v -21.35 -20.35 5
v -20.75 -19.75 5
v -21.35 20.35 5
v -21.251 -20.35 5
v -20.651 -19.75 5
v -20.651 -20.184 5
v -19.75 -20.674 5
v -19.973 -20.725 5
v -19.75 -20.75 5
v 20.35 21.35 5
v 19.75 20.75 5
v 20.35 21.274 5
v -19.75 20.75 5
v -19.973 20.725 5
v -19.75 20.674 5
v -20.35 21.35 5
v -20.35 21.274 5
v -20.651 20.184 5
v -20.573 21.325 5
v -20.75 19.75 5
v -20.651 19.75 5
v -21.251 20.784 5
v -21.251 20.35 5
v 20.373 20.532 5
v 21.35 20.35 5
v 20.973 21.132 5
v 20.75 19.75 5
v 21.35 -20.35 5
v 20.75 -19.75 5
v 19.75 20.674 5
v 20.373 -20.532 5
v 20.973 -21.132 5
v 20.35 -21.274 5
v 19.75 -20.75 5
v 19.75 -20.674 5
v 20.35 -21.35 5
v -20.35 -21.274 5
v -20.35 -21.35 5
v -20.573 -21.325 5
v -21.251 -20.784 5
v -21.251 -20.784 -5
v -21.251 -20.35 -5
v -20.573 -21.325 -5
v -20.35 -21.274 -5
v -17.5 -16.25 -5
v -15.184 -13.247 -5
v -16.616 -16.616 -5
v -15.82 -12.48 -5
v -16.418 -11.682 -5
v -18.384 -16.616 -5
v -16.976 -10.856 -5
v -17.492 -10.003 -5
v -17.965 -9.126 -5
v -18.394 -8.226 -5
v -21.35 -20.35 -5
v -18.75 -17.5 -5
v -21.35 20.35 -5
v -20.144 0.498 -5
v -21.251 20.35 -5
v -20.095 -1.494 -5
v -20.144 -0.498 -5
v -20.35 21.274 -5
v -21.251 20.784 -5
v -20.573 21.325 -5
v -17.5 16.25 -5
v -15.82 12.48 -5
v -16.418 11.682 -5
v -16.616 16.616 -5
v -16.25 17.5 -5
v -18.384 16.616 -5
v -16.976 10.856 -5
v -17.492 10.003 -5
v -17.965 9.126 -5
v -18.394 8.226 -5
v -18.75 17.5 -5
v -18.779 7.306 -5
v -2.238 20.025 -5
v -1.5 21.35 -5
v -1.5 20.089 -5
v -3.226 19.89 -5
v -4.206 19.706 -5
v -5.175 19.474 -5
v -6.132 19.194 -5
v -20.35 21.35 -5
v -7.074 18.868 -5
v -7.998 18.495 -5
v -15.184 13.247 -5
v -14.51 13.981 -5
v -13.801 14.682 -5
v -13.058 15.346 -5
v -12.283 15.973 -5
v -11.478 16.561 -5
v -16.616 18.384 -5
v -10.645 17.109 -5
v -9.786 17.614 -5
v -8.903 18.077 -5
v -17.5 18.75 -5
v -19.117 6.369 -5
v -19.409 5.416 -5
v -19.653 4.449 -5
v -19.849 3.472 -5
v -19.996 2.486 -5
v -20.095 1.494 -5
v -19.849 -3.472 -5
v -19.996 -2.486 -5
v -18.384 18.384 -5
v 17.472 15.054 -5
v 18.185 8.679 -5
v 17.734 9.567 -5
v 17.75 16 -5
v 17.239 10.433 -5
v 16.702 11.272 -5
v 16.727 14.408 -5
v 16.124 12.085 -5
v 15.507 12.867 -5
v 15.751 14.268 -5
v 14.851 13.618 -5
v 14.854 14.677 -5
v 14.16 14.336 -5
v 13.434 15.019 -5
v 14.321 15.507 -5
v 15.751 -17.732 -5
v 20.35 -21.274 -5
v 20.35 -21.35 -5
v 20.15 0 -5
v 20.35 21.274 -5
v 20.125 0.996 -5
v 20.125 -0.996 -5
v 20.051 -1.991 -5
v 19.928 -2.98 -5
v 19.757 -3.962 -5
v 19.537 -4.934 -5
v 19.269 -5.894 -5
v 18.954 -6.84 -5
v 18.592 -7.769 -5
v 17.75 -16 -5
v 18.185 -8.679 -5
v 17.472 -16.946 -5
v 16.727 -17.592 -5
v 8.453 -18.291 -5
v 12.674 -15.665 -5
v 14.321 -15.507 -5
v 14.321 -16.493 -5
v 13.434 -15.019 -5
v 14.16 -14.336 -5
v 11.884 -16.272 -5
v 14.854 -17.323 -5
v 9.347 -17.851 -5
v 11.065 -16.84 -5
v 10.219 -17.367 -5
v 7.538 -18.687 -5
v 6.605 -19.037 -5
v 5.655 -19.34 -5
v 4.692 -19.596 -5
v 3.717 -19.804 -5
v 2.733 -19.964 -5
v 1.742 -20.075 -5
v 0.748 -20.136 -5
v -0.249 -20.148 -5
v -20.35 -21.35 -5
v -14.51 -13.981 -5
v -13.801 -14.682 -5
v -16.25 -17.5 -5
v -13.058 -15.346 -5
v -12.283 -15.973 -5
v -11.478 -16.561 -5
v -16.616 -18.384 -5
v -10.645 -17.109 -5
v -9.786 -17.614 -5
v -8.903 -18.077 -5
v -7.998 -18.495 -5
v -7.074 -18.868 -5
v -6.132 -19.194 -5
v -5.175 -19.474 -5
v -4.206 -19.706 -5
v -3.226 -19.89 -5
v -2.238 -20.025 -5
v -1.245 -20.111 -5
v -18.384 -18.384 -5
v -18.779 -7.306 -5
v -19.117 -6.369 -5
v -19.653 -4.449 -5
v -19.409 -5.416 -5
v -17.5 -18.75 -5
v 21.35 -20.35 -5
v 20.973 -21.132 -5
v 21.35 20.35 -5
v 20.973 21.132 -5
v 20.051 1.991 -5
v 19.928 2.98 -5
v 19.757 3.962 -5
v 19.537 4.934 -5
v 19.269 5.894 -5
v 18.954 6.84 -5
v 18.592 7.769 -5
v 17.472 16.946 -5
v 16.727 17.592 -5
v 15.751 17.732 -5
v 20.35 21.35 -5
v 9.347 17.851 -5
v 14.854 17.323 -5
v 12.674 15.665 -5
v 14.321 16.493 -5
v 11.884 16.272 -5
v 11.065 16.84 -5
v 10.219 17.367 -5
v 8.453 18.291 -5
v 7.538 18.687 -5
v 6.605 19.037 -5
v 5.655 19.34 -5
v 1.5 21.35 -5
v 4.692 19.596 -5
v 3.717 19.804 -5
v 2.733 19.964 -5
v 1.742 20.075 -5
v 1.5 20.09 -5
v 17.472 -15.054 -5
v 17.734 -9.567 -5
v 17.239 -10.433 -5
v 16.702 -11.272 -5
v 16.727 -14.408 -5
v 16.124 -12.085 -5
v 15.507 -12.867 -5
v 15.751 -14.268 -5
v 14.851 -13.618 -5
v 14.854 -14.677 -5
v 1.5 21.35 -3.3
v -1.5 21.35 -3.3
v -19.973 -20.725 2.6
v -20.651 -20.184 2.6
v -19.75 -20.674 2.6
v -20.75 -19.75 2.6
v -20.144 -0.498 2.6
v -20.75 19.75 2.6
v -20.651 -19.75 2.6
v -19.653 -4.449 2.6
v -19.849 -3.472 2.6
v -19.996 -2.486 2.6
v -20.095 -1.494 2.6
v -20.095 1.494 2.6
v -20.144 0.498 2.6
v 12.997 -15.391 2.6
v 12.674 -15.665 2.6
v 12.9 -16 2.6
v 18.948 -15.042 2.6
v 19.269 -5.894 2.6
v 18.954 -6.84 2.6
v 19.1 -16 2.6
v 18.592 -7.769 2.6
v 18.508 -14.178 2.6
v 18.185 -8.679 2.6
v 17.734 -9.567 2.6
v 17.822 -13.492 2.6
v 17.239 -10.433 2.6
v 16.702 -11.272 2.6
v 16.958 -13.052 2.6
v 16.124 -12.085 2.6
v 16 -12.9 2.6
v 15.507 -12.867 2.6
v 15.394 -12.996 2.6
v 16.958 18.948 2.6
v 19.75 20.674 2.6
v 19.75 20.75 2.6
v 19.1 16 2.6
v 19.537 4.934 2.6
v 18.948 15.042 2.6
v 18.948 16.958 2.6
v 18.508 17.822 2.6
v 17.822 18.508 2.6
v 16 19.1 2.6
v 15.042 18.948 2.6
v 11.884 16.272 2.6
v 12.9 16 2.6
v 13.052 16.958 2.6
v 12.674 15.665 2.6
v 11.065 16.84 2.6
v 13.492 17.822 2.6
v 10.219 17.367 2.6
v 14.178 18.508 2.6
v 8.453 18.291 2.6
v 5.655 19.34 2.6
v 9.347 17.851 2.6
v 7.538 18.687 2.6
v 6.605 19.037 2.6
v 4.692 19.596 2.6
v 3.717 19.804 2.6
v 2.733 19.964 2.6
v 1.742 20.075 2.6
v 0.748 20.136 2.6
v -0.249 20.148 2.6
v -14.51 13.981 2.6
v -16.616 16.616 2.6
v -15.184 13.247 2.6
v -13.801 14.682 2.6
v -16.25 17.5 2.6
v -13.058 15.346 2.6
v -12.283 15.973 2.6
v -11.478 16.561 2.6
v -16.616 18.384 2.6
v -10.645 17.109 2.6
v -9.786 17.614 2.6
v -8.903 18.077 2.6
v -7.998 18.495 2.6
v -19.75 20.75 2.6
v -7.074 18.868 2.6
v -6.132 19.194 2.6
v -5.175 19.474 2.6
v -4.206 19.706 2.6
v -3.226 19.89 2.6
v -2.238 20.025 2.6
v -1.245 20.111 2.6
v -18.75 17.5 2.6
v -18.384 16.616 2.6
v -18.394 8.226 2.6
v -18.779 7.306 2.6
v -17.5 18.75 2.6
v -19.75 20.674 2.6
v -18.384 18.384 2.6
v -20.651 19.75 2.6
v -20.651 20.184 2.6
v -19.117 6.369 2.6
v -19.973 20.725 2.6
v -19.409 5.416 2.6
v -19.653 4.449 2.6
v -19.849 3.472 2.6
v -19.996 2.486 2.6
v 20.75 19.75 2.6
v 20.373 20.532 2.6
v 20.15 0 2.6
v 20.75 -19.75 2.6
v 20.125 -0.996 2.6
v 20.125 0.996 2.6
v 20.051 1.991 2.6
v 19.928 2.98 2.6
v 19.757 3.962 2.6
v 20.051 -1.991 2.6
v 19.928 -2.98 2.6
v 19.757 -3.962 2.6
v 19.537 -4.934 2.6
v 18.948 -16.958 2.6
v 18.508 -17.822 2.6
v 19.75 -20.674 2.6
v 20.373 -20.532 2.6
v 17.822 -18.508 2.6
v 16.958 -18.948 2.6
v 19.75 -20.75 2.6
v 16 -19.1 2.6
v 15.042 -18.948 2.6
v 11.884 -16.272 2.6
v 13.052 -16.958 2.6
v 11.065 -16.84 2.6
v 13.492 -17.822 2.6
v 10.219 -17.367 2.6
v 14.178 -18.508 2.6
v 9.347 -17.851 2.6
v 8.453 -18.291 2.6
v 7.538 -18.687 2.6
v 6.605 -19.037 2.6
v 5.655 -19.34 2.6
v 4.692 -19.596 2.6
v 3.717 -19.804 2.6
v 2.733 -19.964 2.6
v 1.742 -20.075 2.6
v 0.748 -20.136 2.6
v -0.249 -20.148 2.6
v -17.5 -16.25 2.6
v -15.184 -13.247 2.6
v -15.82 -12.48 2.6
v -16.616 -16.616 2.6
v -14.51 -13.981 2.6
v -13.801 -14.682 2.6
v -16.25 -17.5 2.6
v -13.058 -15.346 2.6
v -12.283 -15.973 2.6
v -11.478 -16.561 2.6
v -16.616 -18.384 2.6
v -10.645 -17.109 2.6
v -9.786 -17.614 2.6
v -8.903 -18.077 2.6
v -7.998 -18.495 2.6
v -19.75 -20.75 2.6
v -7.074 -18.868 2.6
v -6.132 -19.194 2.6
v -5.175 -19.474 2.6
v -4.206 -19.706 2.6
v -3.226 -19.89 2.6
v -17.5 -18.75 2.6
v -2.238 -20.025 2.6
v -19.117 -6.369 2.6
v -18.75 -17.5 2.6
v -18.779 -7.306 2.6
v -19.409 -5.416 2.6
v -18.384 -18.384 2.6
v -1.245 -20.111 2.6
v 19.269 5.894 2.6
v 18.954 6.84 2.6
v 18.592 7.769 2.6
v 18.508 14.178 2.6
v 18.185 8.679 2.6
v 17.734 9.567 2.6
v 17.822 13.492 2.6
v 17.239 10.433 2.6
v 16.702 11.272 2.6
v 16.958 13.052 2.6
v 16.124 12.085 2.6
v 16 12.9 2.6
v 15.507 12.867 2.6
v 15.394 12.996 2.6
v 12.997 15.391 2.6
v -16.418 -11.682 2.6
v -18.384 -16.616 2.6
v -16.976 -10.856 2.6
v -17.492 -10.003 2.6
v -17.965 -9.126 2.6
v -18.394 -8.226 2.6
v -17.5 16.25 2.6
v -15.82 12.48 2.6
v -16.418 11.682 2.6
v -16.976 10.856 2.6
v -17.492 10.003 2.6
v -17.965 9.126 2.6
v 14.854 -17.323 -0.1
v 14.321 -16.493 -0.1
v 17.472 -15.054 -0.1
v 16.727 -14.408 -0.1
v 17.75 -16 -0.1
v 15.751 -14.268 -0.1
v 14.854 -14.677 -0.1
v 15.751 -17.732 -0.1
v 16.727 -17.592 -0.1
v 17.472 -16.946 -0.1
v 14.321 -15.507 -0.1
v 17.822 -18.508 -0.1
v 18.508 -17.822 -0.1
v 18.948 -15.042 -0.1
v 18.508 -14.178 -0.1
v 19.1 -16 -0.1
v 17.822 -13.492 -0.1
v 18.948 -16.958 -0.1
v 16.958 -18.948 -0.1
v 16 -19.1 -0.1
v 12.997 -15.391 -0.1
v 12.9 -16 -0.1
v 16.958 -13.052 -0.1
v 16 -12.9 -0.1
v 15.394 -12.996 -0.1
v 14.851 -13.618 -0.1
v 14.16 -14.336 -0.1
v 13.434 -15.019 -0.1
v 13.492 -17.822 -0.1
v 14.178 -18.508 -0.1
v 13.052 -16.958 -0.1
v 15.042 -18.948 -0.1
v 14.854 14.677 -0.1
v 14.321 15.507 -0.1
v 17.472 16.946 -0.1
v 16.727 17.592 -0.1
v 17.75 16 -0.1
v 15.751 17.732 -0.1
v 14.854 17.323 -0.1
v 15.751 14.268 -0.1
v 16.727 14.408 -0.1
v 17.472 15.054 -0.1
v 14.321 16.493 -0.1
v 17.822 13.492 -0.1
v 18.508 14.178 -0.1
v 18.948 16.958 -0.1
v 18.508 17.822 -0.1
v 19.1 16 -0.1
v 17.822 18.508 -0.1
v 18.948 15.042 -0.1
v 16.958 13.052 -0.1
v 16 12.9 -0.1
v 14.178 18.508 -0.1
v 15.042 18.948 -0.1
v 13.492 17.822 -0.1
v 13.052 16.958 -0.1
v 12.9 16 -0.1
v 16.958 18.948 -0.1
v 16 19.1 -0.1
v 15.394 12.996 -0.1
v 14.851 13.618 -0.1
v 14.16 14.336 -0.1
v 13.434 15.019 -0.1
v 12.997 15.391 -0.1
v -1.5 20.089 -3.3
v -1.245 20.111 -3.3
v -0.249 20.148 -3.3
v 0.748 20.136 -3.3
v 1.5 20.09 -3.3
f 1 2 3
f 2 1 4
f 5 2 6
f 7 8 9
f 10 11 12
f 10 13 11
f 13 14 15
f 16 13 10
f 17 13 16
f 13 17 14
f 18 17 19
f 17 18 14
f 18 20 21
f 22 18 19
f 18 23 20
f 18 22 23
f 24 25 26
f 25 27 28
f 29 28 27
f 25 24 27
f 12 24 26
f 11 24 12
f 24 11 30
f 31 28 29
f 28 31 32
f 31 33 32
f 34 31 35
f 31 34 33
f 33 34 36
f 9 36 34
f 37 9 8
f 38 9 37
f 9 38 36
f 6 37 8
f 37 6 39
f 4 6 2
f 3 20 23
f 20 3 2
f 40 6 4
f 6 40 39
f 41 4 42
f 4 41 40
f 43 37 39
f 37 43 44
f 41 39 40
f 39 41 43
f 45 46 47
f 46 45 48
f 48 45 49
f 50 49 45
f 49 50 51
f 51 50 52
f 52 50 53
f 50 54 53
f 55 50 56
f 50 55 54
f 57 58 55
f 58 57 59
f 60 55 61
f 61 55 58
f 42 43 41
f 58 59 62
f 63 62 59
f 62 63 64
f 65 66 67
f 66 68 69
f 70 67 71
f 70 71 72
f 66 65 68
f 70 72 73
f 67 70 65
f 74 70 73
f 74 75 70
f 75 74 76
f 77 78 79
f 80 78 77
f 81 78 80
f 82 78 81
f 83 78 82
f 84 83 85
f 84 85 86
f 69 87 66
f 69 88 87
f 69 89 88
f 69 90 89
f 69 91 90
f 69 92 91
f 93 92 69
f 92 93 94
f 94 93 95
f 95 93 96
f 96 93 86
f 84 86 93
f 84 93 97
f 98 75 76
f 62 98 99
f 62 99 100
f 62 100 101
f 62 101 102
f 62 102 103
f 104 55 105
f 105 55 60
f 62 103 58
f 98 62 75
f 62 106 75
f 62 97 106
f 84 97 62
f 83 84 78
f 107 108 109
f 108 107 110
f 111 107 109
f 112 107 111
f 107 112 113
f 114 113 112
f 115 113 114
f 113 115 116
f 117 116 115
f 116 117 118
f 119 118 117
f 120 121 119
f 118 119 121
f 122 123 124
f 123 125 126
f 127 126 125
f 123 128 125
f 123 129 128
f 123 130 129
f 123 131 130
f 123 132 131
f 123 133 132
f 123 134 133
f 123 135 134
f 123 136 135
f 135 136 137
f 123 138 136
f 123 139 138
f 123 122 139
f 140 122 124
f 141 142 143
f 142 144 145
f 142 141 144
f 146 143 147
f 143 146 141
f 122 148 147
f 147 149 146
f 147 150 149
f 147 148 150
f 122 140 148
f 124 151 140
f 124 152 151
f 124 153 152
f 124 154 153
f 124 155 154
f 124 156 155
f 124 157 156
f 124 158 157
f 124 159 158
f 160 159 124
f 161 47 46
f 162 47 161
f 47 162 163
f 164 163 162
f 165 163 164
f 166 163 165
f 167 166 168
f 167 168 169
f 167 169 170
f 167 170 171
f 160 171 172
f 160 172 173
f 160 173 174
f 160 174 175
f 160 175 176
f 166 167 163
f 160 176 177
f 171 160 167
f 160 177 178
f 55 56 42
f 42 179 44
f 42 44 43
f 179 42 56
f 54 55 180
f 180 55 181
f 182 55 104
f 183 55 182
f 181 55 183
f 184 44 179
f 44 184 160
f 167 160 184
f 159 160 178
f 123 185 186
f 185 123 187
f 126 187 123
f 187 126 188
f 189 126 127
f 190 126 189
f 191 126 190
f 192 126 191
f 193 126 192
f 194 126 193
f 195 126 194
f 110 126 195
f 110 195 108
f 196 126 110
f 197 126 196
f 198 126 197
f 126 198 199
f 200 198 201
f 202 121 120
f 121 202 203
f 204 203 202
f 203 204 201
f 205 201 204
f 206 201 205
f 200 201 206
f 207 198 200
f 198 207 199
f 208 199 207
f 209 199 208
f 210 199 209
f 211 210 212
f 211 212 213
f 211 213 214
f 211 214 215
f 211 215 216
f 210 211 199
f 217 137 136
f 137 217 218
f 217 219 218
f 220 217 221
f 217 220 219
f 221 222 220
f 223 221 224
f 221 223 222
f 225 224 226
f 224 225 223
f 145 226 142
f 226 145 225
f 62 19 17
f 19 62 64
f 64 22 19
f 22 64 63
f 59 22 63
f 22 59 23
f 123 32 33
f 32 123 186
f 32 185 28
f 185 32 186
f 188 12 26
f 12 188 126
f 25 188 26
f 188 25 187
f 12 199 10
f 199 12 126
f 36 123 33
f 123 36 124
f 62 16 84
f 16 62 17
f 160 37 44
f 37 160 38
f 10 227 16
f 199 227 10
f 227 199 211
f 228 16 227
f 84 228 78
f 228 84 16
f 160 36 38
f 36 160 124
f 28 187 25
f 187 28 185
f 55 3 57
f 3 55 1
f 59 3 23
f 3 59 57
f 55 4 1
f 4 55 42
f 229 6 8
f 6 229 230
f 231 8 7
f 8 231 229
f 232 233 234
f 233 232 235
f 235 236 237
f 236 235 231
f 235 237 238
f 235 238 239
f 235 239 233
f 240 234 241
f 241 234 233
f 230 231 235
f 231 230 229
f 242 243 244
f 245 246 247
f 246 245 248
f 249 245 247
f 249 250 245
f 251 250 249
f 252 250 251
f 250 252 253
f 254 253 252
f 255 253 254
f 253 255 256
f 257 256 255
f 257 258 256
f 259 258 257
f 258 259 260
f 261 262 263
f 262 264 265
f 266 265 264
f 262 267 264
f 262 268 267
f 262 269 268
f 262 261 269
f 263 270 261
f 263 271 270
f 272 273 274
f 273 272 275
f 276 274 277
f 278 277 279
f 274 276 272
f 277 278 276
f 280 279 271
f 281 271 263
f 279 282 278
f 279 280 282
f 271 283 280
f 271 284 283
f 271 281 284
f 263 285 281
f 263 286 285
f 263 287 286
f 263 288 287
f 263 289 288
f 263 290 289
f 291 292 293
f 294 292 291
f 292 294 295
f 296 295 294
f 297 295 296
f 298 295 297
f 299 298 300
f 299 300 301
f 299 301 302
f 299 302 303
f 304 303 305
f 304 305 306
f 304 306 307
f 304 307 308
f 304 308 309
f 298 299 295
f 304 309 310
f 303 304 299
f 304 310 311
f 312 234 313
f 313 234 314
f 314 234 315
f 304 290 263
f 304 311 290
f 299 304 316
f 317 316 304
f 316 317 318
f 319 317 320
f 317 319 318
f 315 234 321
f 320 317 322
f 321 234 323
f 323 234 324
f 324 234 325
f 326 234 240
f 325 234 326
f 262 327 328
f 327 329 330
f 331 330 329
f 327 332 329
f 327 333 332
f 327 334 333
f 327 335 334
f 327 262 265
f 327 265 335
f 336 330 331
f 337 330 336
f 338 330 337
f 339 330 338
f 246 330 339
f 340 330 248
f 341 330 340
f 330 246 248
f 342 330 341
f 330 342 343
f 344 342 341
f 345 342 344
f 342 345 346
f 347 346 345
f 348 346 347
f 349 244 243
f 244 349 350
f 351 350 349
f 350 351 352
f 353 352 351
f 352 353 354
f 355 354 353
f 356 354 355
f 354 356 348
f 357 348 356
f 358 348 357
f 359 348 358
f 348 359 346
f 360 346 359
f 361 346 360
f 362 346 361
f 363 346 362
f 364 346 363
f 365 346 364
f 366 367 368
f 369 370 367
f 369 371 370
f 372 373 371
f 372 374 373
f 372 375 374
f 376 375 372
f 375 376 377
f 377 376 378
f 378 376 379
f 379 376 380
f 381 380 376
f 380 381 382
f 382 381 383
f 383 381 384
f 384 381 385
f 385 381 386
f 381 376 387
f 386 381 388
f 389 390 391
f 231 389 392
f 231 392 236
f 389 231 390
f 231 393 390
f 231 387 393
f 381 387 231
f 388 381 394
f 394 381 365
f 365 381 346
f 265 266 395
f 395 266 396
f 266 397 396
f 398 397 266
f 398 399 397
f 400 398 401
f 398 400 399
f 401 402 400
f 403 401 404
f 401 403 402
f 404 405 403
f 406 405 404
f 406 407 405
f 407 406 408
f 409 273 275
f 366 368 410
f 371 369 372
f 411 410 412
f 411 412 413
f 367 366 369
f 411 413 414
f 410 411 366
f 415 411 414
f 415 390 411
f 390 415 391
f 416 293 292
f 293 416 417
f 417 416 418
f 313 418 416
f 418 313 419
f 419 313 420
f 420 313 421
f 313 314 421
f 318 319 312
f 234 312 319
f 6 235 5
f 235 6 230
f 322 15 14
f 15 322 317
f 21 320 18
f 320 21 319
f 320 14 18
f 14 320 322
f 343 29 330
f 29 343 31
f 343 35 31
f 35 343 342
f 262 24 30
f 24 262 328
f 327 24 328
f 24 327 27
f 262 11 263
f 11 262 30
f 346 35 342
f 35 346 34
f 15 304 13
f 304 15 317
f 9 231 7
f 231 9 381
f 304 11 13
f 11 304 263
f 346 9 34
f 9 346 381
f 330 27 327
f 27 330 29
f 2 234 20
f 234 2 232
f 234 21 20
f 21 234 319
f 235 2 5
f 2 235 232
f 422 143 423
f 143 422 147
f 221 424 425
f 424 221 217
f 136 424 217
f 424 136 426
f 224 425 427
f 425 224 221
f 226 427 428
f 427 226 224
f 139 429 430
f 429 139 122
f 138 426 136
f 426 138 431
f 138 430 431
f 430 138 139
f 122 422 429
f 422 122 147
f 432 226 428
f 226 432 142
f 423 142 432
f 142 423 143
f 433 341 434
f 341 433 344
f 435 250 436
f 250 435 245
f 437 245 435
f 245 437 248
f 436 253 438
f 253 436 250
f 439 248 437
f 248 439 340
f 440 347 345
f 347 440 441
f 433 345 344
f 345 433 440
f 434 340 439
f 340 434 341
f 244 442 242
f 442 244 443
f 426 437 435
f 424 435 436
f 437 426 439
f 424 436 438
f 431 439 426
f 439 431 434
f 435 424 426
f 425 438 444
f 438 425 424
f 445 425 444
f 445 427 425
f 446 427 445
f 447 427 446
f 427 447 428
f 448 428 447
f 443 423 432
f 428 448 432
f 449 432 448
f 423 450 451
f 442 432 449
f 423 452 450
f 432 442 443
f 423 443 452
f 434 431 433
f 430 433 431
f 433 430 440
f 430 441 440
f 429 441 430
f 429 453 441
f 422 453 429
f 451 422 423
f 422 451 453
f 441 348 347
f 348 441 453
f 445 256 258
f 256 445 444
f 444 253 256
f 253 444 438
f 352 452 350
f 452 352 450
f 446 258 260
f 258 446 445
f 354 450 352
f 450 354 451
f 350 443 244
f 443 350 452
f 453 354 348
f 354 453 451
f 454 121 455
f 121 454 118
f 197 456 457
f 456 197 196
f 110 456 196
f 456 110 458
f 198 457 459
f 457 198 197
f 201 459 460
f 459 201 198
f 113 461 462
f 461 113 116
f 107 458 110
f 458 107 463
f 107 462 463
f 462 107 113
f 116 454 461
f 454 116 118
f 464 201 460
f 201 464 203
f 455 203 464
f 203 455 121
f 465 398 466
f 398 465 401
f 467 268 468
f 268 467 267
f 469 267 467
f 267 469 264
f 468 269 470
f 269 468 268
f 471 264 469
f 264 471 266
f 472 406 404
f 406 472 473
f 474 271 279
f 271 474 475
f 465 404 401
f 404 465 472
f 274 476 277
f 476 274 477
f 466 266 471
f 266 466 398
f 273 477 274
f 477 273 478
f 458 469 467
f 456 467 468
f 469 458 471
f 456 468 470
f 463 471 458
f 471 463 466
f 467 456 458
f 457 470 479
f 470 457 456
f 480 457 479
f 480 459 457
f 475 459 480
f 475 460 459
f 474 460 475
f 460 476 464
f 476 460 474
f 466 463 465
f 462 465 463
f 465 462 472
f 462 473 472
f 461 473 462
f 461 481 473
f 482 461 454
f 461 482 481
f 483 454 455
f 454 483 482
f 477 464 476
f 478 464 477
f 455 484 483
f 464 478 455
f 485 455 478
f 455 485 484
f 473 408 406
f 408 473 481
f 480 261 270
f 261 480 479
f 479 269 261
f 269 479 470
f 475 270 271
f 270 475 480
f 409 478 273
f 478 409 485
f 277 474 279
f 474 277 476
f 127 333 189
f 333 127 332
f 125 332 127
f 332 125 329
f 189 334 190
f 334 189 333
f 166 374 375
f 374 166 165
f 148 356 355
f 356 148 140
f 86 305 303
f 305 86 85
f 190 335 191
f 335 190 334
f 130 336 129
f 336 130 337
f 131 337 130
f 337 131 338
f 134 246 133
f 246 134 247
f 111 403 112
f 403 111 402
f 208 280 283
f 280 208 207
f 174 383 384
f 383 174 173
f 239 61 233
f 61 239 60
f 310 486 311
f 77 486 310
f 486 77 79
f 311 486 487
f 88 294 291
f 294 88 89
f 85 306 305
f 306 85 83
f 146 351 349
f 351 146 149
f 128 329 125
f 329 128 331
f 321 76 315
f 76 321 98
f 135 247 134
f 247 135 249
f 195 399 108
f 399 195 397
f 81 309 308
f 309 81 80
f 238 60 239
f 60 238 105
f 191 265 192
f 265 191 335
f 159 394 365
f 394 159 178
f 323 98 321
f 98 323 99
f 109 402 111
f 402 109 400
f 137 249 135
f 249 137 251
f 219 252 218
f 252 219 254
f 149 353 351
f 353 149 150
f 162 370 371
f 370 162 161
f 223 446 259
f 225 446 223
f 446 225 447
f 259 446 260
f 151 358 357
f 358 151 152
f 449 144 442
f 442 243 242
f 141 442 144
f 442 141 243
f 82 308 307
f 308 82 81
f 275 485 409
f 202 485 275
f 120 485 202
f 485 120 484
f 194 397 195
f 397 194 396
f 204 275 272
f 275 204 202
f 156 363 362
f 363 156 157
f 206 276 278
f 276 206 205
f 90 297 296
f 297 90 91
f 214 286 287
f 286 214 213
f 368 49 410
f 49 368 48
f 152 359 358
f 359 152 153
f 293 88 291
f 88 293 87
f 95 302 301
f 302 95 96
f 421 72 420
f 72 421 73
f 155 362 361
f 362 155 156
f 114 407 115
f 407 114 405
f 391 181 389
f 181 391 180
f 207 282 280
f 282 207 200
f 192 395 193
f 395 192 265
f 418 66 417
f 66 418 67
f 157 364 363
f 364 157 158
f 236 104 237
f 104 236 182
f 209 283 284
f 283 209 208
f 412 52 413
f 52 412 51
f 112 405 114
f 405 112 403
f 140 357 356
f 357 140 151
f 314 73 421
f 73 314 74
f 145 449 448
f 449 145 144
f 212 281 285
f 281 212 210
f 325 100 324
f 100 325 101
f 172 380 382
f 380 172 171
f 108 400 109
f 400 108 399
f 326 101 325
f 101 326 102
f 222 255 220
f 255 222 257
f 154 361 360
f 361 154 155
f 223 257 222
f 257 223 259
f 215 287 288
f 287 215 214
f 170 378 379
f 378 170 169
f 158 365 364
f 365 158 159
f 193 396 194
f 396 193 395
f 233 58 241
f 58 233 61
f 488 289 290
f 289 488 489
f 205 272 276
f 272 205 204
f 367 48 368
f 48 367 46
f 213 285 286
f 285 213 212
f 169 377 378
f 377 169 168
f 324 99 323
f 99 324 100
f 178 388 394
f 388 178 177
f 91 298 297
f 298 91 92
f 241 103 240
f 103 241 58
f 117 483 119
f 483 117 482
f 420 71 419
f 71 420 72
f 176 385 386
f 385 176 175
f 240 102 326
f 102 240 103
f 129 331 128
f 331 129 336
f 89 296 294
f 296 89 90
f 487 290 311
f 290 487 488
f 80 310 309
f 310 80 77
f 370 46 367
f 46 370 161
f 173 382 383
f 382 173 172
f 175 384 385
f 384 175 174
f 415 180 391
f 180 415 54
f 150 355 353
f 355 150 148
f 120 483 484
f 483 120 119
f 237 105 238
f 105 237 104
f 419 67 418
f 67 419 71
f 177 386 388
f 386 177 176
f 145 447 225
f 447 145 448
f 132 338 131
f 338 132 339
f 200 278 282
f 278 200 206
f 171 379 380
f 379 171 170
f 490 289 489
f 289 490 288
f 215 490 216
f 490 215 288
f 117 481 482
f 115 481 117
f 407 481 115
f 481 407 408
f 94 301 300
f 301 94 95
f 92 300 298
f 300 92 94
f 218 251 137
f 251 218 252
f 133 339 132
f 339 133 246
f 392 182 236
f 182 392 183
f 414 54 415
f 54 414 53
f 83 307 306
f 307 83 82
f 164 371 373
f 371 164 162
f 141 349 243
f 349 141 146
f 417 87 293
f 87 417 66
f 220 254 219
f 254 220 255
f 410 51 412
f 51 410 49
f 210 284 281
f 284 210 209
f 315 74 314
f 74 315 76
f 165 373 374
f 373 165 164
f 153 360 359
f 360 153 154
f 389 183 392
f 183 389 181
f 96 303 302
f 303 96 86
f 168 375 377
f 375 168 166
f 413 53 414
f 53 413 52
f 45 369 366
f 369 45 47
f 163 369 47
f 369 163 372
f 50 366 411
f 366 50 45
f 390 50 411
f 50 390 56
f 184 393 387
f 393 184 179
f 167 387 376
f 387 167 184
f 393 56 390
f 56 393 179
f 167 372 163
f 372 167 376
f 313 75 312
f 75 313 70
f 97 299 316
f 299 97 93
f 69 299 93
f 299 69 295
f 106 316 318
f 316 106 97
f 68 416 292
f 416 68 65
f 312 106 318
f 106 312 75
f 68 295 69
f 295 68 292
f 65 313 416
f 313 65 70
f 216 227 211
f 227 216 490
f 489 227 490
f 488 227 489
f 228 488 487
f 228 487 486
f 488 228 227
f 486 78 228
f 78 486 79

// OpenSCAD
use <MCAD/boxes.scad>;

/* [Global] */
// What is the fan size?
fan_w=40;//[40,50]

// What is the position of the holes?
holes = "side";// [fan:Regular fan only, vga:VGA fan only, both:Both fans, cross:Cross position, side:On one side]

/* [Hidden] */
$fs=1;
$fa=1.5;

wall_w = 1.2;
vga_w = 41.5;
vga_h = 10;
vga_int_h = vga_h - 2.4;
vga_hole = 35;
fan_hole = fan_w * 0.8;
vga_hole_d = 2.5;
fan_hole_d = 3.5;
fan_nut_d = 6.2;
fan_nut_h = 3;
wire_w = 3;
wire_h = 1.7;


difference()
{
	if(vga_w > fan_w)
	{
		roundedBox([vga_w + wall_w, vga_w + wall_w, vga_h],1,true);
	}
	else
	{
		roundedBox([fan_w + wall_w, fan_w + wall_w, vga_h],1,true);
	}
	union()
	{
		translate([0,0, vga_int_h/2+1]) roundedBox([vga_w, vga_w, vga_h - vga_int_h + 2],1,true);
		cylinder(r = (vga_w-wall_w)/2, h = vga_h+2, center = true);
		if( holes == "vga" || holes == "cross" || holes == "both"  || holes == "side")
		{
			translate([ -vga_hole/2, -vga_hole/2, 0])
				cylinder(r = vga_hole_d/2, h = vga_h+2, center = true);
		}
		if( holes == "vga" || holes == "cross" || holes == "both" )
		{
			translate([  vga_hole/2,  vga_hole/2, 0])
				cylinder(r = vga_hole_d/2, h = vga_h+2, center = true);
		}
		if( holes == "vga" || holes == "both" )
		{
			translate([  vga_hole/2, -vga_hole/2, 0])
				cylinder(r = vga_hole_d/2, h = vga_h+2, center = true);
		}
		if( holes == "vga" || holes == "both"  || holes == "side" )
		{
			translate([ -vga_hole/2,  vga_hole/2, 0])
				cylinder(r = vga_hole_d/2, h = vga_h+2, center = true);
		}

		if( holes == "fan" || holes == "cross" || holes == "both" )
		{
			translate([ -fan_hole/2,  fan_hole/2, 0])
			{
				cylinder(r = fan_hole_d/2, h = vga_h+2, center = true);
				translate([ 0, 0, vga_int_h/2-(vga_h-vga_int_h)+2])
					cylinder(r = fan_nut_d/2, h = fan_nut_h+4, center = true);
			}
		}
		if( holes == "fan" || holes == "cross" || holes == "both" || holes == "side" )
		{
			translate([  fan_hole/2,  -fan_hole/2, 0])
			{
				cylinder(r = fan_hole_d/2, h = vga_h+2, center = true);
				translate([ 0, 0, vga_int_h/2-(vga_h-vga_int_h)+2])
					cylinder(r = fan_nut_d/2, h = fan_nut_h+4, center = true);
			}
		}
		if( holes == "fan" || holes == "both"  || holes == "side" )
		{
			translate([  fan_hole/2,  fan_hole/2, 0])
			{
				cylinder(r = fan_hole_d/2, h = vga_h+2, center = true);
				translate([ 0, 0, vga_int_h/2-(vga_h-vga_int_h)+2])
					cylinder(r = fan_nut_d/2, h = fan_nut_h+4, center = true);
			}
		}
		if( holes == "fan" || holes == "both" )
		{
			translate([ -fan_hole/2,  -fan_hole/2, 0])
			{
				cylinder(r = fan_hole_d/2, h = vga_h+2, center = true);
				translate([ 0, 0, vga_int_h/2-(vga_h-vga_int_h)+2])
					cylinder(r = fan_nut_d/2, h = fan_nut_h+4, center = true);
			}
		}
		translate([-wire_w/2, 0, - vga_h/2 - 1])
			cube([wire_w,	vga_w + fan_w, wire_h + 1]);
	}
}
